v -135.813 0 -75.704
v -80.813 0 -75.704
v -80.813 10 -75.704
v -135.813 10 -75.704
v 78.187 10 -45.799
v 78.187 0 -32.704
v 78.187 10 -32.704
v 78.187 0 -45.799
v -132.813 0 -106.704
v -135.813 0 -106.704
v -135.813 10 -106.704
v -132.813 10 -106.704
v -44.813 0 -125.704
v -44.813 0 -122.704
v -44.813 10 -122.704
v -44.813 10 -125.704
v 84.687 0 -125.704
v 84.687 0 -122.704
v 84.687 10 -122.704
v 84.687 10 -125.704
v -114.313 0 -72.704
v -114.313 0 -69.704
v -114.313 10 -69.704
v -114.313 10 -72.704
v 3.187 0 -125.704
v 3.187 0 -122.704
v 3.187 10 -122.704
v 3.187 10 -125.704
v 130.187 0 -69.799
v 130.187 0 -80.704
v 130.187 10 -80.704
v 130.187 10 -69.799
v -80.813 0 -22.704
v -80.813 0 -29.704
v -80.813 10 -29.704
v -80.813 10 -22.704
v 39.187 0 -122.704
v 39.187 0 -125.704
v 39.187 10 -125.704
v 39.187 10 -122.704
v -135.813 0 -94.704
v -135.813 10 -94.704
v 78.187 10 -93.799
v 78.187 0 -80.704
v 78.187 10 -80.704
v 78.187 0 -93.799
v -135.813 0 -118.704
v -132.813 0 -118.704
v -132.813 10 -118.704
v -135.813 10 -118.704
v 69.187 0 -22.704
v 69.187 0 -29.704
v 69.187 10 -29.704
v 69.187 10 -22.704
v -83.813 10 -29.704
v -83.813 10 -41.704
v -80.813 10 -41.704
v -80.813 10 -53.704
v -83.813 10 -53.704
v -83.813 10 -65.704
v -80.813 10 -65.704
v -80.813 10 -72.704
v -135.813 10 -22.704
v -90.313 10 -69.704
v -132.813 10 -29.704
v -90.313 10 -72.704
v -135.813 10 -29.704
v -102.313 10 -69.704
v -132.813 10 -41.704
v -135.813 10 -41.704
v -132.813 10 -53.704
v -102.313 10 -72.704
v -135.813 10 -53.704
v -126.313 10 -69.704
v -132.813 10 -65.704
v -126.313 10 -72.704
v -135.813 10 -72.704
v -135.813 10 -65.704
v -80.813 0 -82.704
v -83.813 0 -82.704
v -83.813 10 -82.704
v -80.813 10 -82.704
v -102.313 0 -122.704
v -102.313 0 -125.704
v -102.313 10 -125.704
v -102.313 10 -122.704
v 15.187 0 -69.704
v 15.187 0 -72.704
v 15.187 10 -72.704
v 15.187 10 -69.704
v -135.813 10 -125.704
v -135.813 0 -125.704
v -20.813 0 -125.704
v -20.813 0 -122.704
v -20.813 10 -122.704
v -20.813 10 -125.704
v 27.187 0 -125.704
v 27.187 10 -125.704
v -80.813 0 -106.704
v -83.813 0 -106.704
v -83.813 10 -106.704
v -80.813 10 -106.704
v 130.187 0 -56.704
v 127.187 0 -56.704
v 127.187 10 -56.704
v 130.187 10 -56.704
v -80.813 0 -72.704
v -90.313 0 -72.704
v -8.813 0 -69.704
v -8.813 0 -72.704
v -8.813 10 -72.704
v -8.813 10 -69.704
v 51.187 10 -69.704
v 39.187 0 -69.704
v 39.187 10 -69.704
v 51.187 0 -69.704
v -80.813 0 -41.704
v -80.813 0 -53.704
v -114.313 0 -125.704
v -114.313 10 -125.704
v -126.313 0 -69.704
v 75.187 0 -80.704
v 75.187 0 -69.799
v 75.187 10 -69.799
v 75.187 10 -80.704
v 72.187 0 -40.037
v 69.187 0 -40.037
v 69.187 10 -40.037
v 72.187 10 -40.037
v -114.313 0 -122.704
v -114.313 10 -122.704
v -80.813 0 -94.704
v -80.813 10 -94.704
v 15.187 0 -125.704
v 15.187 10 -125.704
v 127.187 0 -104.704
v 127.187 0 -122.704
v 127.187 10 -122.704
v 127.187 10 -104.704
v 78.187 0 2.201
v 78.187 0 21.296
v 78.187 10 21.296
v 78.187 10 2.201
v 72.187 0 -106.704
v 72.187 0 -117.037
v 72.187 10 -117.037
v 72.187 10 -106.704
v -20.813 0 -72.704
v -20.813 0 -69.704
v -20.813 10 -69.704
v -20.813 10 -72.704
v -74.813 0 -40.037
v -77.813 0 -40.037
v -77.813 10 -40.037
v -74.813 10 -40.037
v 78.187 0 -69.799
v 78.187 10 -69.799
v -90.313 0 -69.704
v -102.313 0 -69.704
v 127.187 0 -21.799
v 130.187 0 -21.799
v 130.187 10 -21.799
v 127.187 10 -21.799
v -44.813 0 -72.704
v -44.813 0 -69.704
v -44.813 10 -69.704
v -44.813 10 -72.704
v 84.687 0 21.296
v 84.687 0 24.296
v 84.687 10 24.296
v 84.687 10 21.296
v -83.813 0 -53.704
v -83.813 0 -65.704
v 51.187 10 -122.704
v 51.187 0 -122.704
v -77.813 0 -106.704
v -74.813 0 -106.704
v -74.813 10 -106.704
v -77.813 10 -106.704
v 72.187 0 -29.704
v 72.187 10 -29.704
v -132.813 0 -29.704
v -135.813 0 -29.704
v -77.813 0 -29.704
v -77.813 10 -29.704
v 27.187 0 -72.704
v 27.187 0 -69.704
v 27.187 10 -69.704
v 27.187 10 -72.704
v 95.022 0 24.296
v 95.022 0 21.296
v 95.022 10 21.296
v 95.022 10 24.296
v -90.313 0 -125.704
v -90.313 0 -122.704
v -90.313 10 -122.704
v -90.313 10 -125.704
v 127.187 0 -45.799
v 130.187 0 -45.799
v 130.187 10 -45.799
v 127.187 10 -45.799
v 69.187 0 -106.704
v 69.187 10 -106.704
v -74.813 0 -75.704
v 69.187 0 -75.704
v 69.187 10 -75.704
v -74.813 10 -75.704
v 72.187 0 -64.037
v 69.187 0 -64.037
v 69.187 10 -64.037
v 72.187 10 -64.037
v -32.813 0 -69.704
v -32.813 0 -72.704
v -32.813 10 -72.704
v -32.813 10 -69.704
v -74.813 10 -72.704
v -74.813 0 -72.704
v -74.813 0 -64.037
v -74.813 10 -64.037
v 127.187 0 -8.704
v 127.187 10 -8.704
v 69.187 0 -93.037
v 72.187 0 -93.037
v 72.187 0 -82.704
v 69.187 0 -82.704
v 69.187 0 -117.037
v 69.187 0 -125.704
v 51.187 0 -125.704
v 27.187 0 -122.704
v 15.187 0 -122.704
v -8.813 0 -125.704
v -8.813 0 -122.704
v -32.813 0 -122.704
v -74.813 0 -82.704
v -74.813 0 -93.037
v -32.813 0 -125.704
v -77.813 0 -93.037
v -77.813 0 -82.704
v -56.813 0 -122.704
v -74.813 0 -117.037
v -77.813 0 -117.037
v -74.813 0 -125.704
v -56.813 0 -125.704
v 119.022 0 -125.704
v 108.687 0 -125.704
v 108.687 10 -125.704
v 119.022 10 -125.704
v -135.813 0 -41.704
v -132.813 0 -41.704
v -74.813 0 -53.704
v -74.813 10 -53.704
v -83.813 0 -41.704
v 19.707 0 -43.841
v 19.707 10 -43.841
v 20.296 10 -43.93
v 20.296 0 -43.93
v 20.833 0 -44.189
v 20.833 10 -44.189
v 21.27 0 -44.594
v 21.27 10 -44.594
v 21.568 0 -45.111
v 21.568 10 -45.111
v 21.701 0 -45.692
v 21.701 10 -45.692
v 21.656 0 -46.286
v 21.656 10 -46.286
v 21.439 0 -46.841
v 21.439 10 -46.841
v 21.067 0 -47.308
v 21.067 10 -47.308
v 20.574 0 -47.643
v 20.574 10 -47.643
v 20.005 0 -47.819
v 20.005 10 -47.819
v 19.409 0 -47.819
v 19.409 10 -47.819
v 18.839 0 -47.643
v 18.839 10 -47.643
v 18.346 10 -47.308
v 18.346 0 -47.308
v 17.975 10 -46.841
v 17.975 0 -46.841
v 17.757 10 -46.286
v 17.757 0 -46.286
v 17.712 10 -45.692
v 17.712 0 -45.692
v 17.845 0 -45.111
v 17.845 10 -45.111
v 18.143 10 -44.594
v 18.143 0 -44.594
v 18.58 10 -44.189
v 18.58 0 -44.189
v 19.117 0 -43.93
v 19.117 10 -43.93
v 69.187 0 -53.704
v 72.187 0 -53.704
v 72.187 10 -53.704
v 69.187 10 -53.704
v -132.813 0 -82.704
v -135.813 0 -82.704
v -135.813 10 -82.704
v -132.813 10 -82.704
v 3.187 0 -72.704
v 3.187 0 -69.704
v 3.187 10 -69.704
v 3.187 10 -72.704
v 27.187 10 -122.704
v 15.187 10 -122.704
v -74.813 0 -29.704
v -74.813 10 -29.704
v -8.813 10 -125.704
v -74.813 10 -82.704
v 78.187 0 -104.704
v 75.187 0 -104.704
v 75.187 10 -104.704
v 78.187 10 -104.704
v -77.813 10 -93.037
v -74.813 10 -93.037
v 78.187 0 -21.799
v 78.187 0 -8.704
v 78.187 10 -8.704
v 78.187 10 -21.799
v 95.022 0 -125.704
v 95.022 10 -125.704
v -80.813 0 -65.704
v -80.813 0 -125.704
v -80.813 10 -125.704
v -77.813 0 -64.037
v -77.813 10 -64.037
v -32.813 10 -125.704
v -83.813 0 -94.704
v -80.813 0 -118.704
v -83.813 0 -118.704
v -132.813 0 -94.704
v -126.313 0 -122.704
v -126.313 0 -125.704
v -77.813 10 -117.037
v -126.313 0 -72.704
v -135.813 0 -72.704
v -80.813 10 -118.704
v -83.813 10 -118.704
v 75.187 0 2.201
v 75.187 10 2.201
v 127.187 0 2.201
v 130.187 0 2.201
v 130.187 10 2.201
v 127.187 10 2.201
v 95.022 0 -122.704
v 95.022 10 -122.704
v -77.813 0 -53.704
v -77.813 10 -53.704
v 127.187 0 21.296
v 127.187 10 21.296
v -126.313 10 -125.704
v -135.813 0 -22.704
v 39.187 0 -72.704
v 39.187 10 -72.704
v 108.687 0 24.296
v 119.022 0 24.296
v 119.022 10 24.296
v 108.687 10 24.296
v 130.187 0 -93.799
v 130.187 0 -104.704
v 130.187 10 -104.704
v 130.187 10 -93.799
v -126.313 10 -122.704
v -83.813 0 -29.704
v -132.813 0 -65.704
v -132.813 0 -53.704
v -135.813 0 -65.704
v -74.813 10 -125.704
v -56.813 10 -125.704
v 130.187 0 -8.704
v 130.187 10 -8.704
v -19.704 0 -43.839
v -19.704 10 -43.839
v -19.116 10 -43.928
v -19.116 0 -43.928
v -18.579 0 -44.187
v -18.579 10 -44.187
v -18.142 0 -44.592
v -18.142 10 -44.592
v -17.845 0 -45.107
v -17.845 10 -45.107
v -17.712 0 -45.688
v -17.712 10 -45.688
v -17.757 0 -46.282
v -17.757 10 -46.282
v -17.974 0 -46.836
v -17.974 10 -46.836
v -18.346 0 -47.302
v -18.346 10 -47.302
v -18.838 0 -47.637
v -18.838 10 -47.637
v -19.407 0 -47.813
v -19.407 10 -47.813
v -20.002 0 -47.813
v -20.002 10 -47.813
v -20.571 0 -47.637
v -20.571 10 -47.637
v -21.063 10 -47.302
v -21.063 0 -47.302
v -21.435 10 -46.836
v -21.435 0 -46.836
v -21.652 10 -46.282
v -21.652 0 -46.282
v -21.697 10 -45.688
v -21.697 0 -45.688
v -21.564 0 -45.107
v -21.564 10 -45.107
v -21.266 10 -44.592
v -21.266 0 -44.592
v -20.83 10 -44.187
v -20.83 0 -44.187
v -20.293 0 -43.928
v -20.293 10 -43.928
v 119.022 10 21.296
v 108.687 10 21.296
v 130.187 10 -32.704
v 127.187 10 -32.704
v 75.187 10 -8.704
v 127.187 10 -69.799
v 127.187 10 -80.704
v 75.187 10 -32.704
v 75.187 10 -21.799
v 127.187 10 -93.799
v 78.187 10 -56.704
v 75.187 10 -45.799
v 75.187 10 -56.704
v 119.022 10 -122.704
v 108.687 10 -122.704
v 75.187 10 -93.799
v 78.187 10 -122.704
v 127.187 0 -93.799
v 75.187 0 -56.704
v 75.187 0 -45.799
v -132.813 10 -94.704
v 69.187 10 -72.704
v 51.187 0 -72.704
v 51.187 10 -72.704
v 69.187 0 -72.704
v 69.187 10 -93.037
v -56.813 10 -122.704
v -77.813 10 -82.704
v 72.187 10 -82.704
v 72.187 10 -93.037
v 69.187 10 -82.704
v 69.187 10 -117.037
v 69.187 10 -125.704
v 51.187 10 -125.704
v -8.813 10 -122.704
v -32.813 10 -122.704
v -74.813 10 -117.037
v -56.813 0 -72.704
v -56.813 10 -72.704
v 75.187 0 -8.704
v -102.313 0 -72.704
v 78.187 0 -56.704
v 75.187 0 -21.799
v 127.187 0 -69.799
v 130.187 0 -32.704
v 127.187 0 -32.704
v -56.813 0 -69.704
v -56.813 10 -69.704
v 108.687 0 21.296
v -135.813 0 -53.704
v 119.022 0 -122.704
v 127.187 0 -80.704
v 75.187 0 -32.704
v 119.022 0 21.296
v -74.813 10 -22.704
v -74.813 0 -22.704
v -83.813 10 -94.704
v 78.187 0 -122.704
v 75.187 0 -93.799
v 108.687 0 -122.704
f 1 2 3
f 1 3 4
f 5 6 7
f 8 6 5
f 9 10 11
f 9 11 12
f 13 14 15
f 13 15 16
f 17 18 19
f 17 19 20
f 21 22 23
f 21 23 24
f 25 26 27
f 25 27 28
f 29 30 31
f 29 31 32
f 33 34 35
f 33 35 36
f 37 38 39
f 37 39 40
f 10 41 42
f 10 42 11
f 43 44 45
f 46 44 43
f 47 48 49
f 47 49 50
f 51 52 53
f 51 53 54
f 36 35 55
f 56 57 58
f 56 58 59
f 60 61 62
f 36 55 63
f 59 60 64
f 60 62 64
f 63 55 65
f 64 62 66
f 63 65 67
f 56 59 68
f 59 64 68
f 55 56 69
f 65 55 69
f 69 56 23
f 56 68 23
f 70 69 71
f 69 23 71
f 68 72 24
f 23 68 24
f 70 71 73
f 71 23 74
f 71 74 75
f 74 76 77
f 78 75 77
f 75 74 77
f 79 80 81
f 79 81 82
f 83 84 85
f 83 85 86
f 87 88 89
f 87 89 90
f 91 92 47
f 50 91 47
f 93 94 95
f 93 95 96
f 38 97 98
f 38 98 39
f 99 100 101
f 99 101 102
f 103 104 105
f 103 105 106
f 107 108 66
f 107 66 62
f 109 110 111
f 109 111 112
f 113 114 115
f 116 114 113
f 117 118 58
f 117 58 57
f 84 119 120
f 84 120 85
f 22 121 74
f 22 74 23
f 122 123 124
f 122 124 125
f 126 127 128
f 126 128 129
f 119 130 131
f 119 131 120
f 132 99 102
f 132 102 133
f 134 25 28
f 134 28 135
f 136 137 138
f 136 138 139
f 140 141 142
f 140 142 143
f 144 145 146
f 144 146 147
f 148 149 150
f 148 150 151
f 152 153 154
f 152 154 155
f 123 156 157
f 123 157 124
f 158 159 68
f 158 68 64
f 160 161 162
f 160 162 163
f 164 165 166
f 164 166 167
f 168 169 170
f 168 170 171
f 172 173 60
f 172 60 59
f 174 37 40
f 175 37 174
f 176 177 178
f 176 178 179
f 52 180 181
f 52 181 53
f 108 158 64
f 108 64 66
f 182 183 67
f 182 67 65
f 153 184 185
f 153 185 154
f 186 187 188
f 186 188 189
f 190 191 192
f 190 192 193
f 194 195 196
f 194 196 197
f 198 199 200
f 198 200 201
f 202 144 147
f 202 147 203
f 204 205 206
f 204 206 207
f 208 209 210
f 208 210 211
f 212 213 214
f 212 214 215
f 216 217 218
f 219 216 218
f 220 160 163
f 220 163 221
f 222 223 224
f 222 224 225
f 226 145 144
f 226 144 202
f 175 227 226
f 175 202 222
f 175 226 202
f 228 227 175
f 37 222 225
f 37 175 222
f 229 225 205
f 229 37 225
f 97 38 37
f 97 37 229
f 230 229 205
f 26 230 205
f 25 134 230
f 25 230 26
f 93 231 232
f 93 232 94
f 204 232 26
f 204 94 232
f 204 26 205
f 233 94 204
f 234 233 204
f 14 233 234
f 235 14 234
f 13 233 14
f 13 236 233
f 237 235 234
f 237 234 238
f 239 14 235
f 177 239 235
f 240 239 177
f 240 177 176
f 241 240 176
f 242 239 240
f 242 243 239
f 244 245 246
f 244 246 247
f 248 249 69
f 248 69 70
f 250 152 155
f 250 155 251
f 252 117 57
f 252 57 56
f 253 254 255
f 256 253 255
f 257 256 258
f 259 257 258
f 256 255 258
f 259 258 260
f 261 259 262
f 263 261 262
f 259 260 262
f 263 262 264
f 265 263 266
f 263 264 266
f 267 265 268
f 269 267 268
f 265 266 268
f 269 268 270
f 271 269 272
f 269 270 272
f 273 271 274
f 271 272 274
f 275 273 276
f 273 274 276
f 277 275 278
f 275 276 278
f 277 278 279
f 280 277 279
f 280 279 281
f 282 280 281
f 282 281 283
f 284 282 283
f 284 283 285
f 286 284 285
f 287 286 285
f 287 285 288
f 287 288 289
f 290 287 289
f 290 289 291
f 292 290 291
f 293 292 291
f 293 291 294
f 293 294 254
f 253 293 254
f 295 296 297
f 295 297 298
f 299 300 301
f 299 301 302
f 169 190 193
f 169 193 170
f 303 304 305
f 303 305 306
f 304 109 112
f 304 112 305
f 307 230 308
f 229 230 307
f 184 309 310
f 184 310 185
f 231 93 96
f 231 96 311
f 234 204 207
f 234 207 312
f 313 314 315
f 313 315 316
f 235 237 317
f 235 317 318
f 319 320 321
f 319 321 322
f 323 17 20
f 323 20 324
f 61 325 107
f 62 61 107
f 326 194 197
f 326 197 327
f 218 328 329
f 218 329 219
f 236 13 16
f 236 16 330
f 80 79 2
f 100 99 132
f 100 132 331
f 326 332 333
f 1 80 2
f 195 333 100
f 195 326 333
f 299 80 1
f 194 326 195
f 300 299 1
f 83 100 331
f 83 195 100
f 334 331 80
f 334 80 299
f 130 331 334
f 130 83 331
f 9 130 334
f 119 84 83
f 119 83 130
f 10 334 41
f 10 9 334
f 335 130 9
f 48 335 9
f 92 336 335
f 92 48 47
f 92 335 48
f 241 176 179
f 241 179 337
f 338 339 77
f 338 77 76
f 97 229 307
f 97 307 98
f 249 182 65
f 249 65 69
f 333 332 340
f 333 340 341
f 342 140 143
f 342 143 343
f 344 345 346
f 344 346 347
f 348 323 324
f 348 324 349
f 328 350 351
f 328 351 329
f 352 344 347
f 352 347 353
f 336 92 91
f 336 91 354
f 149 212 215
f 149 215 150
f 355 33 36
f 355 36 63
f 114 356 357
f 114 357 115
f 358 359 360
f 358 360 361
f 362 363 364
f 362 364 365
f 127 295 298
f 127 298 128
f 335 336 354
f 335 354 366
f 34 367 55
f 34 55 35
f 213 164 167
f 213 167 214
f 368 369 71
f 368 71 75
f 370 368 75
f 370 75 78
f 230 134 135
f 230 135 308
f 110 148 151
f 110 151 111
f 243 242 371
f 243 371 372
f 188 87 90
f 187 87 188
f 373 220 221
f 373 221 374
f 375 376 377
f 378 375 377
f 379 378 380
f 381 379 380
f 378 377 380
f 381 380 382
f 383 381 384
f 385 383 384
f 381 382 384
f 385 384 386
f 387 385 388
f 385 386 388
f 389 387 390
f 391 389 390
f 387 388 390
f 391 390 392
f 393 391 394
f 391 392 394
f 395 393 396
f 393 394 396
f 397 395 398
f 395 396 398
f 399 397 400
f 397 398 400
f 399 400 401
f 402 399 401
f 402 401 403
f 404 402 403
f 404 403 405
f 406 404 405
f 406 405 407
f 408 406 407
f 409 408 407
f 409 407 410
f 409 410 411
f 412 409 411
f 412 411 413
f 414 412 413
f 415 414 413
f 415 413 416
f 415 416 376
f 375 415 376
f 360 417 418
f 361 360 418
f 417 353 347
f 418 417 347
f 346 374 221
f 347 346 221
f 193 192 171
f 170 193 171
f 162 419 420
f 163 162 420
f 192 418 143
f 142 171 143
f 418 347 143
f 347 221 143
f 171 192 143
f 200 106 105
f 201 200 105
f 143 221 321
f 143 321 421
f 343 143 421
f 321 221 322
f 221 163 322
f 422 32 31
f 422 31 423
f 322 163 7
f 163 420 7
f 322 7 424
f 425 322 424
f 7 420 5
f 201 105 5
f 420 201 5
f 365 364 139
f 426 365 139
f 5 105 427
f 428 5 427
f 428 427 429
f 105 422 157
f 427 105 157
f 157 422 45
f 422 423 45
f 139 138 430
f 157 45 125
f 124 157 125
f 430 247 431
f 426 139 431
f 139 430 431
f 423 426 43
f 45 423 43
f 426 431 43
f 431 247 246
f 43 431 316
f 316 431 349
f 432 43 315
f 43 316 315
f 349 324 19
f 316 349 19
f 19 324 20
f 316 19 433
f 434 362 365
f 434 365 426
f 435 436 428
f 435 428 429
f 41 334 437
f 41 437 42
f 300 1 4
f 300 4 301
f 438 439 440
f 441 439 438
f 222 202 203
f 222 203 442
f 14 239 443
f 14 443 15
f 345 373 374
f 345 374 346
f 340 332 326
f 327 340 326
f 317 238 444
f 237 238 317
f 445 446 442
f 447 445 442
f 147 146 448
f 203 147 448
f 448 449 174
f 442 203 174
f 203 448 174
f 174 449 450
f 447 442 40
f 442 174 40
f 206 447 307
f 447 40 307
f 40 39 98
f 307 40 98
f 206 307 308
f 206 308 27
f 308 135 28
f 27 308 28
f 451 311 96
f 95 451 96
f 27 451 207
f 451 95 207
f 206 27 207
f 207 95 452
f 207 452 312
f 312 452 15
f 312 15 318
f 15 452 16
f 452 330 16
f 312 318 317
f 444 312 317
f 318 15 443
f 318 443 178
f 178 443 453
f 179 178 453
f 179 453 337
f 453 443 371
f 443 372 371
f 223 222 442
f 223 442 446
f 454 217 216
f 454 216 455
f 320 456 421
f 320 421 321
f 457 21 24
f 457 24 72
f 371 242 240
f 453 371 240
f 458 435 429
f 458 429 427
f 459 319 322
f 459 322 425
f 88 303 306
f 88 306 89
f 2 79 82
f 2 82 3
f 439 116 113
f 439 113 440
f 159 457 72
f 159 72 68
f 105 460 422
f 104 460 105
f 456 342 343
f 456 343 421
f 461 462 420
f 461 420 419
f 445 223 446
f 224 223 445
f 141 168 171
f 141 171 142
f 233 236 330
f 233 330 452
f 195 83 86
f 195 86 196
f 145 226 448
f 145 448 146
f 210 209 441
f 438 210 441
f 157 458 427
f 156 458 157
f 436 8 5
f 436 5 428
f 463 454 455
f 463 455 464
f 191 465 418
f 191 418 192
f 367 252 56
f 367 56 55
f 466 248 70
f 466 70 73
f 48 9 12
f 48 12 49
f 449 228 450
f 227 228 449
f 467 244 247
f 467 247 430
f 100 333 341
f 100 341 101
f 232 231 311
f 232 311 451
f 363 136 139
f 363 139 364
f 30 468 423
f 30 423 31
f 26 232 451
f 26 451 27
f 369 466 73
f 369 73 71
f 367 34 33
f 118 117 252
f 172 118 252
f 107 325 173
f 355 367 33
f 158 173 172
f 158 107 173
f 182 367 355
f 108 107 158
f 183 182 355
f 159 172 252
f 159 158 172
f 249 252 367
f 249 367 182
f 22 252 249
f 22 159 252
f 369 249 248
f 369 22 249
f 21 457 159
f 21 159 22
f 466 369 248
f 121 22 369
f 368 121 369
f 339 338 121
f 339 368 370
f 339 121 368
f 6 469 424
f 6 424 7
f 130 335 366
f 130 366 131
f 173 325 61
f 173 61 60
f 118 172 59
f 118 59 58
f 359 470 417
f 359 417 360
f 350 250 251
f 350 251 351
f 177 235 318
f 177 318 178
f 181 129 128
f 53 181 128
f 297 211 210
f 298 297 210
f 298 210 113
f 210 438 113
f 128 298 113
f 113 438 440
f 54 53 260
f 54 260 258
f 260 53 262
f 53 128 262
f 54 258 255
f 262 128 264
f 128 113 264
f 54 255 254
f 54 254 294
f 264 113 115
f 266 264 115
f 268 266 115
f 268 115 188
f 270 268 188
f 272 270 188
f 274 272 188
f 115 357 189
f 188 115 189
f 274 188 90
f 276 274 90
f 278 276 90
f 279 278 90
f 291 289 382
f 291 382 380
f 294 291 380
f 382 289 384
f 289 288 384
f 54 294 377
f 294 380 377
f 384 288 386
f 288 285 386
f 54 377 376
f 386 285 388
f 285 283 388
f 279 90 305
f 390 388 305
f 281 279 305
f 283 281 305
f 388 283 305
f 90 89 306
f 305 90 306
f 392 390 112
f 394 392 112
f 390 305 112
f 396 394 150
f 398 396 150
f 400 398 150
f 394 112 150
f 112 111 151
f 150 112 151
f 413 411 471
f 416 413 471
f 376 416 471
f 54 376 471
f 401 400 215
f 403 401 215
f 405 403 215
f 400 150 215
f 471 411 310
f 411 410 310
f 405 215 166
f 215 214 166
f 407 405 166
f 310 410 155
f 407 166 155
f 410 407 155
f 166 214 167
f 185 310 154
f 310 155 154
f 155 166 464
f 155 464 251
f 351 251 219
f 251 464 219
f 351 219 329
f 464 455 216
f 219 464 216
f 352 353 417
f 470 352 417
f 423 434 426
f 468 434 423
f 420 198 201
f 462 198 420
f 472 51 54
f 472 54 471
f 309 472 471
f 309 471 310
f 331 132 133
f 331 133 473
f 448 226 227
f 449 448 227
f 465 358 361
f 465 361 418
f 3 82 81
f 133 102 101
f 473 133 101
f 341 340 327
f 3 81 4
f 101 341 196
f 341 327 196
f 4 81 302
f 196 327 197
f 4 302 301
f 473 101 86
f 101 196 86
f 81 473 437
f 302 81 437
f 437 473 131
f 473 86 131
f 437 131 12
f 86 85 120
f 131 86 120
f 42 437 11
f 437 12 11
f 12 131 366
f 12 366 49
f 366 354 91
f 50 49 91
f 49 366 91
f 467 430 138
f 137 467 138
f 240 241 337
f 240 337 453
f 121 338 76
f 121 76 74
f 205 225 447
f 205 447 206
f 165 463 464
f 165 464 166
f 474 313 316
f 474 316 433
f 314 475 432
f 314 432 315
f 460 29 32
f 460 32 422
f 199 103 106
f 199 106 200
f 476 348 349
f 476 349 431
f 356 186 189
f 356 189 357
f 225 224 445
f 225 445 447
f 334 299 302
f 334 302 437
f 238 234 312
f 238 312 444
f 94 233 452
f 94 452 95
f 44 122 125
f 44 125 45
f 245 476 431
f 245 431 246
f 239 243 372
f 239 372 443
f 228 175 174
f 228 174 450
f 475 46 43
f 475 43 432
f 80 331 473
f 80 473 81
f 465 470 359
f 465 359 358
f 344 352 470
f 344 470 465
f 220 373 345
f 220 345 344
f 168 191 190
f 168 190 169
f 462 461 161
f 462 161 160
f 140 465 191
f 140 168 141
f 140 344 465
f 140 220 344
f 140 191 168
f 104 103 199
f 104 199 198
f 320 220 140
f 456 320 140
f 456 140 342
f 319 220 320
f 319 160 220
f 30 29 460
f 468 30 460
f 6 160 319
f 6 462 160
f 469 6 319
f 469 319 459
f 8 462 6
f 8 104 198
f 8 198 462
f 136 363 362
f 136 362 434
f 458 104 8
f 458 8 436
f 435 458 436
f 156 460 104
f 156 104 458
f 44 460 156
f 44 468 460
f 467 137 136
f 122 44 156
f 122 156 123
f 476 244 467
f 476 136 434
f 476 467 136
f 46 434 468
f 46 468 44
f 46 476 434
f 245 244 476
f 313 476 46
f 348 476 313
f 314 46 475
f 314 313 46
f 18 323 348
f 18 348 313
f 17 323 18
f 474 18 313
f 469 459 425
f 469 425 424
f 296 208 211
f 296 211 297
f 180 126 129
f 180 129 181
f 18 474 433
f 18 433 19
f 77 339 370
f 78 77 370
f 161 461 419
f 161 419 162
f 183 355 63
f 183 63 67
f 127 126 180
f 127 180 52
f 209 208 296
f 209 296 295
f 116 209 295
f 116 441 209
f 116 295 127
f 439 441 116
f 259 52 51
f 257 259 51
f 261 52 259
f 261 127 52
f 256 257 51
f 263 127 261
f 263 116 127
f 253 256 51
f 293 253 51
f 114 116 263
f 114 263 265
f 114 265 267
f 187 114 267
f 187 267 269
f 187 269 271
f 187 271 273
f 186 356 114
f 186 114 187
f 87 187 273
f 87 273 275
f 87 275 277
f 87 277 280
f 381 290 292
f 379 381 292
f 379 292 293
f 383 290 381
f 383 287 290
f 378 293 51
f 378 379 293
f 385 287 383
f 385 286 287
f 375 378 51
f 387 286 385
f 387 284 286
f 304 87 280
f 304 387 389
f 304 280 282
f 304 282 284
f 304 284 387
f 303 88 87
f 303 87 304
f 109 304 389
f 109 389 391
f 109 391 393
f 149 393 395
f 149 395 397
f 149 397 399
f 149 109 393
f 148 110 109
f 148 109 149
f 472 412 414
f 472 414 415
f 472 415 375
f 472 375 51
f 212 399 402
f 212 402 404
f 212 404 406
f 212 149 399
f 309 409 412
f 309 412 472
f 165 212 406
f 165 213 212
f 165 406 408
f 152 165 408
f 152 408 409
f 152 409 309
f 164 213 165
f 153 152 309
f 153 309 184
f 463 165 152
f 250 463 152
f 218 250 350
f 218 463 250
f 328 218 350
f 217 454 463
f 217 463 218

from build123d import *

# Parameters (mm, degrees)
BOSS_EXTRUDE1_DEPTH   = 10
BOSS_EXTRUDE1_2_DEPTH = 10
BOSS_EXTRUDE1_3_DEPTH = 10
BOSS_EXTRUDE1_4_DEPTH = 10
BOSS_EXTRUDE1_5_DEPTH = 10
SKETCH2_R             = 1.997822351
SKETCH2_R_2           = 2.000000328
CUT_EXTRUDE1_DEPTH    = 186.328261156


with BuildPart() as part:
    # Sketch1 → Boss-Extrude1 (new body)
    with BuildSketch(Plane(origin=(0, 0, 0), x_dir=(1, 0, 0), z_dir=(0, 1, 0))):
        Polygon((-32.812912017, 122.703686357), (-20.812911913, 122.703686357), (-20.812911913, 125.703692436), (-8.812911808, 125.703692436), (-8.812911808, 122.703686357), (3.187088063, 122.703686357), (3.187088063, 125.703692436), (15.1870884, 125.703692436), (15.1870884, 122.703686357), (27.187088504, 122.703686357), (27.187088504, 125.703692436), (39.187088609, 125.703692436), (39.187088609, 122.703686357), (51.18708685, 122.703686357), (51.18708685, 125.703692436), (69.187089801, 125.703692436), (69.187089801, 122.703686357), (69.187089801, 117.03671515), (72.18708843, 117.03671515), (72.18708843, 106.703691185), (69.187089801, 106.703691185), (69.187089801, 93.036711216), (72.18708843, 93.036711216), (72.18708843, 82.703687251), (69.187089801, 82.703687251), (69.187089801, 75.703687966), (-74.812911451, 75.703687966), (-74.812911451, 82.703687251), (-77.81291008, 82.703687251), (-77.81291008, 93.036711216), (-74.812911451, 93.036711216), (-74.812911451, 106.703691185), (-77.81291008, 106.703691185), (-77.81291008, 117.03671515), (-74.812911451, 117.03671515), (-74.812911451, 122.703686357), (-74.812911451, 125.703692436), (-56.812912226, 125.703692436), (-56.812912226, 122.703686357), (-44.812910259, 122.703686357), (-44.812910259, 125.703692436), (-32.812912017, 125.703692436), align=None)
    extrude(amount=BOSS_EXTRUDE1_DEPTH)


with BuildPart() as body_2:
    # Sketch1 → Boss-Extrude1 2 (new body)
    with BuildSketch(Plane(origin=(0, 0, 0), x_dir=(1, 0, 0), z_dir=(0, 1, 0))):
        Polygon((-135.812908411, 125.703692436), (-126.31291151, 125.703692436), (-126.31291151, 122.703686357), (-114.312909544, 122.703686357), (-114.312909544, 125.703692436), (-102.312915027, 125.703692436), (-102.312915027, 122.703686357), (-90.31291306, 122.703686357), (-90.31291306, 125.703692436), (-80.812908709, 125.703692436), (-80.812908709, 122.703686357), (-80.812908709, 118.703693151), (-83.812914789, 118.703693151), (-83.812914789, 106.703691185), (-80.812908709, 106.703691185), (-80.812908709, 94.703689218), (-83.812914789, 94.703689218), (-83.812914789, 82.703687251), (-80.812908709, 82.703687251), (-80.812908709, 75.703687966), (-135.812908411, 75.703687966), (-135.812908411, 82.703687251), (-132.812917233, 82.703687251), (-132.812917233, 94.703689218), (-135.812908411, 94.703689218), (-135.812908411, 106.703691185), (-132.812917233, 106.703691185), (-132.812917233, 118.703693151), (-135.812908411, 118.703693151), (-135.812908411, 122.703686357), align=None)
    extrude(amount=BOSS_EXTRUDE1_2_DEPTH)


with BuildPart() as body_3:
    # Sketch1 → Boss-Extrude1 3 (new body)
    with BuildSketch(Plane(origin=(0, 0, 0), x_dir=(1, 0, 0), z_dir=(0, 1, 0))):
        Polygon((-135.812908411, 72.703689337), (-126.31291151, 72.703689337), (-126.31291151, 69.703683257), (-114.312909544, 69.703683257), (-114.312909544, 72.703689337), (-102.312915027, 72.703689337), (-102.312915027, 69.703683257), (-90.31291306, 69.703683257), (-90.31291306, 72.703689337), (-80.812908709, 72.703689337), (-80.812908709, 69.703683257), (-80.812908709, 65.703690052), (-83.812914789, 65.703690052), (-83.812914789, 53.703688085), (-80.812908709, 53.703688085), (-80.812908709, 41.703686118), (-83.812914789, 41.703686118), (-83.812914789, 29.703684151), (-80.812908709, 29.703684151), (-80.812908709, 22.703684866), (-135.812908411, 22.703684866), (-135.812908411, 29.703684151), (-132.812917233, 29.703684151), (-132.812917233, 41.703686118), (-135.812908411, 41.703686118), (-135.812908411, 53.703688085), (-132.812917233, 53.703688085), (-132.812917233, 65.703690052), (-135.812908411, 65.703690052), (-135.812908411, 69.703683257), align=None)
    extrude(amount=BOSS_EXTRUDE1_3_DEPTH)


with BuildPart() as body_4:
    # Sketch1 → Boss-Extrude1 4 (new body)
    with BuildSketch(Plane(origin=(0, 0, 0), x_dir=(1, 0, 0), z_dir=(0, 1, 0))):
        Polygon((-32.812912017, 69.703683257), (-20.812911913, 69.703683257), (-20.812911913, 72.703689337), (-8.812911808, 72.703689337), (-8.812911808, 69.703683257), (3.187088063, 69.703683257), (3.187088063, 72.703689337), (15.1870884, 72.703689337), (15.1870884, 69.703683257), (27.187088504, 69.703683257), (27.187088504, 72.703689337), (39.187088609, 72.703689337), (39.187088609, 69.703683257), (51.18708685, 69.703683257), (51.18708685, 72.703689337), (69.187089801, 72.703689337), (69.187089801, 69.703683257), (69.187089801, 64.03671205), (72.18708843, 64.03671205), (72.18708843, 53.703688085), (69.187089801, 53.703688085), (69.187089801, 40.036708117), (72.18708843, 40.036708117), (72.18708843, 29.703684151), (69.187089801, 29.703684151), (69.187089801, 22.703684866), (-74.812911451, 22.703684866), (-74.812911451, 29.703684151), (-77.81291008, 29.703684151), (-77.81291008, 40.036708117), (-74.812911451, 40.036708117), (-74.812911451, 53.703688085), (-77.81291008, 53.703688085), (-77.81291008, 64.03671205), (-74.812911451, 64.03671205), (-74.812911451, 69.703683257), (-74.812911451, 72.703689337), (-56.812912226, 72.703689337), (-56.812912226, 69.703683257), (-44.812910259, 69.703683257), (-44.812910259, 72.703689337), (-32.812912017, 72.703689337), align=None)
    extrude(amount=BOSS_EXTRUDE1_4_DEPTH)

    # Sketch2 → Cut-Extrude1 (cut, through all)
    with BuildSketch(Plane(origin=(0, 10, 0), x_dir=(1, 0, 0), z_dir=(0, 1, 0))):
        with Locations(Location((-19.704415408, 45.837319398, 0), (0, 0, 270))):
            Circle(SKETCH2_R)
        with Locations(Location((19.706618041, 45.84139958, 0), (0, 0, 270))):
            Circle(SKETCH2_R_2)
    extrude(amount=-CUT_EXTRUDE1_DEPTH, mode=Mode.SUBTRACT)


with BuildPart() as body_5:
    # Sketch1 → Boss-Extrude1 5 (new body)
    with BuildSketch(Plane(origin=(0, 0, 0), x_dir=(1, 0, 0), z_dir=(0, 1, 0))):
        Polygon((95.021896064, 122.703686357), (108.687087893, 122.703686357), (108.687087893, 125.703692436), (119.021899998, 125.703692436), (119.021899998, 122.703686357), (127.187088132, 122.703686357), (127.187088132, 104.703687131), (130.187094212, 104.703687131), (130.187094212, 93.799009919), (127.187088132, 93.799009919), (127.187088132, 80.703690648), (130.187094212, 80.703690648), (130.187094212, 69.799013436), (127.187088132, 69.799013436), (127.187088132, 56.703690439), (130.187094212, 56.703690439), (130.187094212, 45.799020678), (127.187088132, 45.799020678), (127.187088132, 32.703690231), (130.187094212, 32.703690231), (130.187094212, 21.799016744), (127.187088132, 21.799016744), (127.187088132, 8.703690022), (130.187094212, 8.703690022), (130.187094212, -2.200983232), (127.187088132, -2.200983232), (127.187088132, -21.29631117), (119.021899998, -21.29631117), (119.021899998, -24.296309799), (108.687087893, -24.296309799), (108.687087893, -21.29631117), (95.021896064, -21.29631117), (95.021896064, -24.296309799), (84.68709141, -24.296309799), (84.68709141, -21.29631117), (78.187085688, -21.29631117), (78.187085688, -2.200983232), (75.187087059, -2.200983232), (75.187087059, 8.703690022), (78.187085688, 8.703690022), (78.187085688, 21.799016744), (75.187087059, 21.799016744), (75.187087059, 32.703690231), (78.187085688, 32.703690231), (78.187085688, 45.799020678), (75.187087059, 45.799020678), (75.187087059, 56.703690439), (78.187085688, 56.703690439), (78.187085688, 69.799013436), (75.187087059, 69.799013436), (75.187087059, 80.703690648), (78.187085688, 80.703690648), (78.187085688, 93.799009919), (75.187087059, 93.799009919), (75.187087059, 104.703687131), (78.187085688, 104.703687131), (78.187085688, 122.703686357), (84.68709141, 122.703686357), (84.68709141, 125.703692436), (95.021896064, 125.703692436), align=None)
    extrude(amount=BOSS_EXTRUDE1_5_DEPTH)


solid = Compound([part.part, body_2.part, body_3.part, body_4.part, body_5.part])
